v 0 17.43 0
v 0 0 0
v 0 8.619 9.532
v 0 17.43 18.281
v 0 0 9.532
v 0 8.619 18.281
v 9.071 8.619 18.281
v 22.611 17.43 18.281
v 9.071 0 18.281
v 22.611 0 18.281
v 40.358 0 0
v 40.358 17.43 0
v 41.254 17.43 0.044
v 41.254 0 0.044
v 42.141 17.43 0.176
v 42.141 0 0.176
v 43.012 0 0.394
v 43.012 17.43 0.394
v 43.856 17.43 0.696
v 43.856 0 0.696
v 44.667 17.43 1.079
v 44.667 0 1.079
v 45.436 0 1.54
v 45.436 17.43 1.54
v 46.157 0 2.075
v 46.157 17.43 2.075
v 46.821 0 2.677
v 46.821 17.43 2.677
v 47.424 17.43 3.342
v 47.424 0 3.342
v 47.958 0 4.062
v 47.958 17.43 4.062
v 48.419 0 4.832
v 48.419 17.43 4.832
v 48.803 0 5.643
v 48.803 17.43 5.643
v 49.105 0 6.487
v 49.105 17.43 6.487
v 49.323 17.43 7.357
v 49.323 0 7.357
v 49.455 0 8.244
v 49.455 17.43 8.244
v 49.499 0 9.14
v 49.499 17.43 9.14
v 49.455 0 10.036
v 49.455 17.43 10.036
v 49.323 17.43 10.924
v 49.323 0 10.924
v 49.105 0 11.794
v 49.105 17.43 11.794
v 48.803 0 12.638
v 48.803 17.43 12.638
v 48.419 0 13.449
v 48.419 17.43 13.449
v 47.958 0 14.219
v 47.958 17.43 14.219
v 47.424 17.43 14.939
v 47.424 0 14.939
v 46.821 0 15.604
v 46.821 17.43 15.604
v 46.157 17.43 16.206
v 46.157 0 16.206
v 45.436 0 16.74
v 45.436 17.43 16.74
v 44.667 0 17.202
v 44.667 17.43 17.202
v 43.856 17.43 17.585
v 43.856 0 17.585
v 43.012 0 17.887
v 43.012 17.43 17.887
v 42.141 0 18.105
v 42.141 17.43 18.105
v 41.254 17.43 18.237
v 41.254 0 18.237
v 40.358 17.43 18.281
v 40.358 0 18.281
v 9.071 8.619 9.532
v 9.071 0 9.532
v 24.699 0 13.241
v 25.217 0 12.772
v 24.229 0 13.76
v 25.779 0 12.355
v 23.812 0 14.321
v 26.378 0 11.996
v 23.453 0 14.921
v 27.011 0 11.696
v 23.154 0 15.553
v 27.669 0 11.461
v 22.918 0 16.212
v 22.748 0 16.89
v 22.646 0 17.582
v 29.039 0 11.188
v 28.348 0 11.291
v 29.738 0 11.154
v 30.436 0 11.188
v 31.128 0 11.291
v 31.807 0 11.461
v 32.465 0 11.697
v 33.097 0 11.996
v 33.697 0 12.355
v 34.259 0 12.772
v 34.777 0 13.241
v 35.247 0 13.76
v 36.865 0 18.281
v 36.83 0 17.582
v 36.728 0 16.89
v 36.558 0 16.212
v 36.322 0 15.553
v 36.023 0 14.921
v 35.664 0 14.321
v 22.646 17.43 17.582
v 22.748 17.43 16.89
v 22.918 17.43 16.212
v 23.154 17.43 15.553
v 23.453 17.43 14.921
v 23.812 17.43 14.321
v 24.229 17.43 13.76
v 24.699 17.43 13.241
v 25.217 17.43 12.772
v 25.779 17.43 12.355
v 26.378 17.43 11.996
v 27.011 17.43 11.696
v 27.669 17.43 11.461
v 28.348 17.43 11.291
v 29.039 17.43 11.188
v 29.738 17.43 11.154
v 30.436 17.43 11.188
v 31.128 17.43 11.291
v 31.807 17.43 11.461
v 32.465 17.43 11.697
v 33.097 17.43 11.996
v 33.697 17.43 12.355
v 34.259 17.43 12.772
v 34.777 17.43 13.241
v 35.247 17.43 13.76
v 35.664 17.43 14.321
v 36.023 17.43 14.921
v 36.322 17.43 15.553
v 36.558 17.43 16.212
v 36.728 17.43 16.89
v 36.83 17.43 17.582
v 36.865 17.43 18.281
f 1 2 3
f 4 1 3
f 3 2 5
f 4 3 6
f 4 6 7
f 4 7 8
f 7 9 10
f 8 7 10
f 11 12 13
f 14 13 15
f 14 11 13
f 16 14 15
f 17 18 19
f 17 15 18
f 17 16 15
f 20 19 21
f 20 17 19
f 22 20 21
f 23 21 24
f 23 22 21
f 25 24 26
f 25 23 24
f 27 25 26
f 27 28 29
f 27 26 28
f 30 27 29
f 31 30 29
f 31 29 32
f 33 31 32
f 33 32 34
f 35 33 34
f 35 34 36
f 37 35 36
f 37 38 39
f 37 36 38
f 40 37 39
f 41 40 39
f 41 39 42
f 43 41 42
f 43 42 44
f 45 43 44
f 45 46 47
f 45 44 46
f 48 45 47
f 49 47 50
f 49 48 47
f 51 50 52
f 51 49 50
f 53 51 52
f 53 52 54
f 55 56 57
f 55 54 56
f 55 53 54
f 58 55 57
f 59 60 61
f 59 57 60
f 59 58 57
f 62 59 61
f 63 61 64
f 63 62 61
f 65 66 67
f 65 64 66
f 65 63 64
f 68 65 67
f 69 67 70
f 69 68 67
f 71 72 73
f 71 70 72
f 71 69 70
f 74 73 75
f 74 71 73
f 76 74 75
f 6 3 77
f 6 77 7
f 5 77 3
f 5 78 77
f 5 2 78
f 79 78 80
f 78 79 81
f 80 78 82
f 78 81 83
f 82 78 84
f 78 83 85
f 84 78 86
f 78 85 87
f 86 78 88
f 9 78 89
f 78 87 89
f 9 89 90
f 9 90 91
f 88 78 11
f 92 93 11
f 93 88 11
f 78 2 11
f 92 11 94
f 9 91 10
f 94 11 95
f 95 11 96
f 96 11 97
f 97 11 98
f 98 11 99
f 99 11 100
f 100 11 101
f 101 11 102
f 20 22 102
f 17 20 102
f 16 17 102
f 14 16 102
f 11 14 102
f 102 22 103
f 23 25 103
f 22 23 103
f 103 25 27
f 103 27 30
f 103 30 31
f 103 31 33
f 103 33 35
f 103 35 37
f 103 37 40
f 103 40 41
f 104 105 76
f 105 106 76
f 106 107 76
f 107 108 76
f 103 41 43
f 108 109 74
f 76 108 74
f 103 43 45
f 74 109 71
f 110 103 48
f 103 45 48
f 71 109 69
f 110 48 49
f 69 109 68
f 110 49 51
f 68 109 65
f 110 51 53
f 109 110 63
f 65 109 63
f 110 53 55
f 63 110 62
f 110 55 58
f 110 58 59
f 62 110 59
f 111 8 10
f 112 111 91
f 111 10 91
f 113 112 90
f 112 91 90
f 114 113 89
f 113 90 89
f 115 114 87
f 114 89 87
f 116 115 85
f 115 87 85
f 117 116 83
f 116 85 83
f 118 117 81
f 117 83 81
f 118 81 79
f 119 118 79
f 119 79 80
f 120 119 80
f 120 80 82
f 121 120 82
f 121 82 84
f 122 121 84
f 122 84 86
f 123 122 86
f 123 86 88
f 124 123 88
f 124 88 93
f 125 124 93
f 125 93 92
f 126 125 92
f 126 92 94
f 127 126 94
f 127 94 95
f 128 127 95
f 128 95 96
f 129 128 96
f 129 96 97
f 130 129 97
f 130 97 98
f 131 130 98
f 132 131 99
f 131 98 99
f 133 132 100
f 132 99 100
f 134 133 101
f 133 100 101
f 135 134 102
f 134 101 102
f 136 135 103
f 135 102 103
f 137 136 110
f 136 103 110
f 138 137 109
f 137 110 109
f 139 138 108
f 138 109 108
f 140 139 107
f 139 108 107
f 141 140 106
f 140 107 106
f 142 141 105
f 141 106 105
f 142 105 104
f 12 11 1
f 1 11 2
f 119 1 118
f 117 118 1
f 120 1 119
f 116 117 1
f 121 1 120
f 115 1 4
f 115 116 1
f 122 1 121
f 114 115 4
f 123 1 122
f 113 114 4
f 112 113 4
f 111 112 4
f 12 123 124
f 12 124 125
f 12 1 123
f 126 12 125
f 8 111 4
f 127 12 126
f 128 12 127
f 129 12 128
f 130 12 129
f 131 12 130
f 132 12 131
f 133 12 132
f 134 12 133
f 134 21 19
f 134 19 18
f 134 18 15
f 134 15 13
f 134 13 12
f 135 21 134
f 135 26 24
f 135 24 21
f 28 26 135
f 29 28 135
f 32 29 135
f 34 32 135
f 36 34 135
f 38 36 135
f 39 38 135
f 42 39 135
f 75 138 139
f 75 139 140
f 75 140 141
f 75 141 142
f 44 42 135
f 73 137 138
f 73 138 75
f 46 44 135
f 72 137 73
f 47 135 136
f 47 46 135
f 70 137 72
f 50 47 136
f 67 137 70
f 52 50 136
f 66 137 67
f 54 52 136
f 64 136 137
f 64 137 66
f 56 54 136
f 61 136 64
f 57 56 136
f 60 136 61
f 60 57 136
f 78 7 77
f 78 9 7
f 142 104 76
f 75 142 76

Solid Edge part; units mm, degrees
sketch "Sketch1" plane through (0, 0, 0) normal (0, -1, 0) x (1, 0, 0)
  line L0 (40.3582, 0) -> (0, 0)
  line L1 (0, 0) -> (0, 18.2807)
  line L2 (0, 18.2807) -> (40.3582, 18.2807)
  arc A0 (40.3582, 18.2808) -> (40.3582, 0) centre (40.3582, 9.1404) cw
extrude "Protrusion1" add sketch "Sketch1" against normal blind 17.4305
sketch "Sketch2" plane through (0, 0, 0) normal (0, -1, 0) x (1, 0, 0)
  circle A0 centre (29.7379, 18.2807) radius 7.1267
extrude "ExtrudedCutout_1" cut sketch "Sketch2" against normal blind 28.8602
sketch "Sketch3" plane through (24.7493, 0, 9.1404) normal (0, -1, 0) x (1, 0, 0)
  line L0 (-15.6782, 9.1404) -> (-15.6782, 0.3921)
  line L1 (-15.6782, 0.3921) -> (-24.7493, 0.3921)
  line L2 (-24.7493, 0.3921) -> (-24.7493, 9.1404)
  line L3 (-24.7493, 9.1404) -> (-15.6782, 9.1404)
extrude "ExtrudedCutout_2" cut sketch "Sketch3" against normal blind 8.6187
